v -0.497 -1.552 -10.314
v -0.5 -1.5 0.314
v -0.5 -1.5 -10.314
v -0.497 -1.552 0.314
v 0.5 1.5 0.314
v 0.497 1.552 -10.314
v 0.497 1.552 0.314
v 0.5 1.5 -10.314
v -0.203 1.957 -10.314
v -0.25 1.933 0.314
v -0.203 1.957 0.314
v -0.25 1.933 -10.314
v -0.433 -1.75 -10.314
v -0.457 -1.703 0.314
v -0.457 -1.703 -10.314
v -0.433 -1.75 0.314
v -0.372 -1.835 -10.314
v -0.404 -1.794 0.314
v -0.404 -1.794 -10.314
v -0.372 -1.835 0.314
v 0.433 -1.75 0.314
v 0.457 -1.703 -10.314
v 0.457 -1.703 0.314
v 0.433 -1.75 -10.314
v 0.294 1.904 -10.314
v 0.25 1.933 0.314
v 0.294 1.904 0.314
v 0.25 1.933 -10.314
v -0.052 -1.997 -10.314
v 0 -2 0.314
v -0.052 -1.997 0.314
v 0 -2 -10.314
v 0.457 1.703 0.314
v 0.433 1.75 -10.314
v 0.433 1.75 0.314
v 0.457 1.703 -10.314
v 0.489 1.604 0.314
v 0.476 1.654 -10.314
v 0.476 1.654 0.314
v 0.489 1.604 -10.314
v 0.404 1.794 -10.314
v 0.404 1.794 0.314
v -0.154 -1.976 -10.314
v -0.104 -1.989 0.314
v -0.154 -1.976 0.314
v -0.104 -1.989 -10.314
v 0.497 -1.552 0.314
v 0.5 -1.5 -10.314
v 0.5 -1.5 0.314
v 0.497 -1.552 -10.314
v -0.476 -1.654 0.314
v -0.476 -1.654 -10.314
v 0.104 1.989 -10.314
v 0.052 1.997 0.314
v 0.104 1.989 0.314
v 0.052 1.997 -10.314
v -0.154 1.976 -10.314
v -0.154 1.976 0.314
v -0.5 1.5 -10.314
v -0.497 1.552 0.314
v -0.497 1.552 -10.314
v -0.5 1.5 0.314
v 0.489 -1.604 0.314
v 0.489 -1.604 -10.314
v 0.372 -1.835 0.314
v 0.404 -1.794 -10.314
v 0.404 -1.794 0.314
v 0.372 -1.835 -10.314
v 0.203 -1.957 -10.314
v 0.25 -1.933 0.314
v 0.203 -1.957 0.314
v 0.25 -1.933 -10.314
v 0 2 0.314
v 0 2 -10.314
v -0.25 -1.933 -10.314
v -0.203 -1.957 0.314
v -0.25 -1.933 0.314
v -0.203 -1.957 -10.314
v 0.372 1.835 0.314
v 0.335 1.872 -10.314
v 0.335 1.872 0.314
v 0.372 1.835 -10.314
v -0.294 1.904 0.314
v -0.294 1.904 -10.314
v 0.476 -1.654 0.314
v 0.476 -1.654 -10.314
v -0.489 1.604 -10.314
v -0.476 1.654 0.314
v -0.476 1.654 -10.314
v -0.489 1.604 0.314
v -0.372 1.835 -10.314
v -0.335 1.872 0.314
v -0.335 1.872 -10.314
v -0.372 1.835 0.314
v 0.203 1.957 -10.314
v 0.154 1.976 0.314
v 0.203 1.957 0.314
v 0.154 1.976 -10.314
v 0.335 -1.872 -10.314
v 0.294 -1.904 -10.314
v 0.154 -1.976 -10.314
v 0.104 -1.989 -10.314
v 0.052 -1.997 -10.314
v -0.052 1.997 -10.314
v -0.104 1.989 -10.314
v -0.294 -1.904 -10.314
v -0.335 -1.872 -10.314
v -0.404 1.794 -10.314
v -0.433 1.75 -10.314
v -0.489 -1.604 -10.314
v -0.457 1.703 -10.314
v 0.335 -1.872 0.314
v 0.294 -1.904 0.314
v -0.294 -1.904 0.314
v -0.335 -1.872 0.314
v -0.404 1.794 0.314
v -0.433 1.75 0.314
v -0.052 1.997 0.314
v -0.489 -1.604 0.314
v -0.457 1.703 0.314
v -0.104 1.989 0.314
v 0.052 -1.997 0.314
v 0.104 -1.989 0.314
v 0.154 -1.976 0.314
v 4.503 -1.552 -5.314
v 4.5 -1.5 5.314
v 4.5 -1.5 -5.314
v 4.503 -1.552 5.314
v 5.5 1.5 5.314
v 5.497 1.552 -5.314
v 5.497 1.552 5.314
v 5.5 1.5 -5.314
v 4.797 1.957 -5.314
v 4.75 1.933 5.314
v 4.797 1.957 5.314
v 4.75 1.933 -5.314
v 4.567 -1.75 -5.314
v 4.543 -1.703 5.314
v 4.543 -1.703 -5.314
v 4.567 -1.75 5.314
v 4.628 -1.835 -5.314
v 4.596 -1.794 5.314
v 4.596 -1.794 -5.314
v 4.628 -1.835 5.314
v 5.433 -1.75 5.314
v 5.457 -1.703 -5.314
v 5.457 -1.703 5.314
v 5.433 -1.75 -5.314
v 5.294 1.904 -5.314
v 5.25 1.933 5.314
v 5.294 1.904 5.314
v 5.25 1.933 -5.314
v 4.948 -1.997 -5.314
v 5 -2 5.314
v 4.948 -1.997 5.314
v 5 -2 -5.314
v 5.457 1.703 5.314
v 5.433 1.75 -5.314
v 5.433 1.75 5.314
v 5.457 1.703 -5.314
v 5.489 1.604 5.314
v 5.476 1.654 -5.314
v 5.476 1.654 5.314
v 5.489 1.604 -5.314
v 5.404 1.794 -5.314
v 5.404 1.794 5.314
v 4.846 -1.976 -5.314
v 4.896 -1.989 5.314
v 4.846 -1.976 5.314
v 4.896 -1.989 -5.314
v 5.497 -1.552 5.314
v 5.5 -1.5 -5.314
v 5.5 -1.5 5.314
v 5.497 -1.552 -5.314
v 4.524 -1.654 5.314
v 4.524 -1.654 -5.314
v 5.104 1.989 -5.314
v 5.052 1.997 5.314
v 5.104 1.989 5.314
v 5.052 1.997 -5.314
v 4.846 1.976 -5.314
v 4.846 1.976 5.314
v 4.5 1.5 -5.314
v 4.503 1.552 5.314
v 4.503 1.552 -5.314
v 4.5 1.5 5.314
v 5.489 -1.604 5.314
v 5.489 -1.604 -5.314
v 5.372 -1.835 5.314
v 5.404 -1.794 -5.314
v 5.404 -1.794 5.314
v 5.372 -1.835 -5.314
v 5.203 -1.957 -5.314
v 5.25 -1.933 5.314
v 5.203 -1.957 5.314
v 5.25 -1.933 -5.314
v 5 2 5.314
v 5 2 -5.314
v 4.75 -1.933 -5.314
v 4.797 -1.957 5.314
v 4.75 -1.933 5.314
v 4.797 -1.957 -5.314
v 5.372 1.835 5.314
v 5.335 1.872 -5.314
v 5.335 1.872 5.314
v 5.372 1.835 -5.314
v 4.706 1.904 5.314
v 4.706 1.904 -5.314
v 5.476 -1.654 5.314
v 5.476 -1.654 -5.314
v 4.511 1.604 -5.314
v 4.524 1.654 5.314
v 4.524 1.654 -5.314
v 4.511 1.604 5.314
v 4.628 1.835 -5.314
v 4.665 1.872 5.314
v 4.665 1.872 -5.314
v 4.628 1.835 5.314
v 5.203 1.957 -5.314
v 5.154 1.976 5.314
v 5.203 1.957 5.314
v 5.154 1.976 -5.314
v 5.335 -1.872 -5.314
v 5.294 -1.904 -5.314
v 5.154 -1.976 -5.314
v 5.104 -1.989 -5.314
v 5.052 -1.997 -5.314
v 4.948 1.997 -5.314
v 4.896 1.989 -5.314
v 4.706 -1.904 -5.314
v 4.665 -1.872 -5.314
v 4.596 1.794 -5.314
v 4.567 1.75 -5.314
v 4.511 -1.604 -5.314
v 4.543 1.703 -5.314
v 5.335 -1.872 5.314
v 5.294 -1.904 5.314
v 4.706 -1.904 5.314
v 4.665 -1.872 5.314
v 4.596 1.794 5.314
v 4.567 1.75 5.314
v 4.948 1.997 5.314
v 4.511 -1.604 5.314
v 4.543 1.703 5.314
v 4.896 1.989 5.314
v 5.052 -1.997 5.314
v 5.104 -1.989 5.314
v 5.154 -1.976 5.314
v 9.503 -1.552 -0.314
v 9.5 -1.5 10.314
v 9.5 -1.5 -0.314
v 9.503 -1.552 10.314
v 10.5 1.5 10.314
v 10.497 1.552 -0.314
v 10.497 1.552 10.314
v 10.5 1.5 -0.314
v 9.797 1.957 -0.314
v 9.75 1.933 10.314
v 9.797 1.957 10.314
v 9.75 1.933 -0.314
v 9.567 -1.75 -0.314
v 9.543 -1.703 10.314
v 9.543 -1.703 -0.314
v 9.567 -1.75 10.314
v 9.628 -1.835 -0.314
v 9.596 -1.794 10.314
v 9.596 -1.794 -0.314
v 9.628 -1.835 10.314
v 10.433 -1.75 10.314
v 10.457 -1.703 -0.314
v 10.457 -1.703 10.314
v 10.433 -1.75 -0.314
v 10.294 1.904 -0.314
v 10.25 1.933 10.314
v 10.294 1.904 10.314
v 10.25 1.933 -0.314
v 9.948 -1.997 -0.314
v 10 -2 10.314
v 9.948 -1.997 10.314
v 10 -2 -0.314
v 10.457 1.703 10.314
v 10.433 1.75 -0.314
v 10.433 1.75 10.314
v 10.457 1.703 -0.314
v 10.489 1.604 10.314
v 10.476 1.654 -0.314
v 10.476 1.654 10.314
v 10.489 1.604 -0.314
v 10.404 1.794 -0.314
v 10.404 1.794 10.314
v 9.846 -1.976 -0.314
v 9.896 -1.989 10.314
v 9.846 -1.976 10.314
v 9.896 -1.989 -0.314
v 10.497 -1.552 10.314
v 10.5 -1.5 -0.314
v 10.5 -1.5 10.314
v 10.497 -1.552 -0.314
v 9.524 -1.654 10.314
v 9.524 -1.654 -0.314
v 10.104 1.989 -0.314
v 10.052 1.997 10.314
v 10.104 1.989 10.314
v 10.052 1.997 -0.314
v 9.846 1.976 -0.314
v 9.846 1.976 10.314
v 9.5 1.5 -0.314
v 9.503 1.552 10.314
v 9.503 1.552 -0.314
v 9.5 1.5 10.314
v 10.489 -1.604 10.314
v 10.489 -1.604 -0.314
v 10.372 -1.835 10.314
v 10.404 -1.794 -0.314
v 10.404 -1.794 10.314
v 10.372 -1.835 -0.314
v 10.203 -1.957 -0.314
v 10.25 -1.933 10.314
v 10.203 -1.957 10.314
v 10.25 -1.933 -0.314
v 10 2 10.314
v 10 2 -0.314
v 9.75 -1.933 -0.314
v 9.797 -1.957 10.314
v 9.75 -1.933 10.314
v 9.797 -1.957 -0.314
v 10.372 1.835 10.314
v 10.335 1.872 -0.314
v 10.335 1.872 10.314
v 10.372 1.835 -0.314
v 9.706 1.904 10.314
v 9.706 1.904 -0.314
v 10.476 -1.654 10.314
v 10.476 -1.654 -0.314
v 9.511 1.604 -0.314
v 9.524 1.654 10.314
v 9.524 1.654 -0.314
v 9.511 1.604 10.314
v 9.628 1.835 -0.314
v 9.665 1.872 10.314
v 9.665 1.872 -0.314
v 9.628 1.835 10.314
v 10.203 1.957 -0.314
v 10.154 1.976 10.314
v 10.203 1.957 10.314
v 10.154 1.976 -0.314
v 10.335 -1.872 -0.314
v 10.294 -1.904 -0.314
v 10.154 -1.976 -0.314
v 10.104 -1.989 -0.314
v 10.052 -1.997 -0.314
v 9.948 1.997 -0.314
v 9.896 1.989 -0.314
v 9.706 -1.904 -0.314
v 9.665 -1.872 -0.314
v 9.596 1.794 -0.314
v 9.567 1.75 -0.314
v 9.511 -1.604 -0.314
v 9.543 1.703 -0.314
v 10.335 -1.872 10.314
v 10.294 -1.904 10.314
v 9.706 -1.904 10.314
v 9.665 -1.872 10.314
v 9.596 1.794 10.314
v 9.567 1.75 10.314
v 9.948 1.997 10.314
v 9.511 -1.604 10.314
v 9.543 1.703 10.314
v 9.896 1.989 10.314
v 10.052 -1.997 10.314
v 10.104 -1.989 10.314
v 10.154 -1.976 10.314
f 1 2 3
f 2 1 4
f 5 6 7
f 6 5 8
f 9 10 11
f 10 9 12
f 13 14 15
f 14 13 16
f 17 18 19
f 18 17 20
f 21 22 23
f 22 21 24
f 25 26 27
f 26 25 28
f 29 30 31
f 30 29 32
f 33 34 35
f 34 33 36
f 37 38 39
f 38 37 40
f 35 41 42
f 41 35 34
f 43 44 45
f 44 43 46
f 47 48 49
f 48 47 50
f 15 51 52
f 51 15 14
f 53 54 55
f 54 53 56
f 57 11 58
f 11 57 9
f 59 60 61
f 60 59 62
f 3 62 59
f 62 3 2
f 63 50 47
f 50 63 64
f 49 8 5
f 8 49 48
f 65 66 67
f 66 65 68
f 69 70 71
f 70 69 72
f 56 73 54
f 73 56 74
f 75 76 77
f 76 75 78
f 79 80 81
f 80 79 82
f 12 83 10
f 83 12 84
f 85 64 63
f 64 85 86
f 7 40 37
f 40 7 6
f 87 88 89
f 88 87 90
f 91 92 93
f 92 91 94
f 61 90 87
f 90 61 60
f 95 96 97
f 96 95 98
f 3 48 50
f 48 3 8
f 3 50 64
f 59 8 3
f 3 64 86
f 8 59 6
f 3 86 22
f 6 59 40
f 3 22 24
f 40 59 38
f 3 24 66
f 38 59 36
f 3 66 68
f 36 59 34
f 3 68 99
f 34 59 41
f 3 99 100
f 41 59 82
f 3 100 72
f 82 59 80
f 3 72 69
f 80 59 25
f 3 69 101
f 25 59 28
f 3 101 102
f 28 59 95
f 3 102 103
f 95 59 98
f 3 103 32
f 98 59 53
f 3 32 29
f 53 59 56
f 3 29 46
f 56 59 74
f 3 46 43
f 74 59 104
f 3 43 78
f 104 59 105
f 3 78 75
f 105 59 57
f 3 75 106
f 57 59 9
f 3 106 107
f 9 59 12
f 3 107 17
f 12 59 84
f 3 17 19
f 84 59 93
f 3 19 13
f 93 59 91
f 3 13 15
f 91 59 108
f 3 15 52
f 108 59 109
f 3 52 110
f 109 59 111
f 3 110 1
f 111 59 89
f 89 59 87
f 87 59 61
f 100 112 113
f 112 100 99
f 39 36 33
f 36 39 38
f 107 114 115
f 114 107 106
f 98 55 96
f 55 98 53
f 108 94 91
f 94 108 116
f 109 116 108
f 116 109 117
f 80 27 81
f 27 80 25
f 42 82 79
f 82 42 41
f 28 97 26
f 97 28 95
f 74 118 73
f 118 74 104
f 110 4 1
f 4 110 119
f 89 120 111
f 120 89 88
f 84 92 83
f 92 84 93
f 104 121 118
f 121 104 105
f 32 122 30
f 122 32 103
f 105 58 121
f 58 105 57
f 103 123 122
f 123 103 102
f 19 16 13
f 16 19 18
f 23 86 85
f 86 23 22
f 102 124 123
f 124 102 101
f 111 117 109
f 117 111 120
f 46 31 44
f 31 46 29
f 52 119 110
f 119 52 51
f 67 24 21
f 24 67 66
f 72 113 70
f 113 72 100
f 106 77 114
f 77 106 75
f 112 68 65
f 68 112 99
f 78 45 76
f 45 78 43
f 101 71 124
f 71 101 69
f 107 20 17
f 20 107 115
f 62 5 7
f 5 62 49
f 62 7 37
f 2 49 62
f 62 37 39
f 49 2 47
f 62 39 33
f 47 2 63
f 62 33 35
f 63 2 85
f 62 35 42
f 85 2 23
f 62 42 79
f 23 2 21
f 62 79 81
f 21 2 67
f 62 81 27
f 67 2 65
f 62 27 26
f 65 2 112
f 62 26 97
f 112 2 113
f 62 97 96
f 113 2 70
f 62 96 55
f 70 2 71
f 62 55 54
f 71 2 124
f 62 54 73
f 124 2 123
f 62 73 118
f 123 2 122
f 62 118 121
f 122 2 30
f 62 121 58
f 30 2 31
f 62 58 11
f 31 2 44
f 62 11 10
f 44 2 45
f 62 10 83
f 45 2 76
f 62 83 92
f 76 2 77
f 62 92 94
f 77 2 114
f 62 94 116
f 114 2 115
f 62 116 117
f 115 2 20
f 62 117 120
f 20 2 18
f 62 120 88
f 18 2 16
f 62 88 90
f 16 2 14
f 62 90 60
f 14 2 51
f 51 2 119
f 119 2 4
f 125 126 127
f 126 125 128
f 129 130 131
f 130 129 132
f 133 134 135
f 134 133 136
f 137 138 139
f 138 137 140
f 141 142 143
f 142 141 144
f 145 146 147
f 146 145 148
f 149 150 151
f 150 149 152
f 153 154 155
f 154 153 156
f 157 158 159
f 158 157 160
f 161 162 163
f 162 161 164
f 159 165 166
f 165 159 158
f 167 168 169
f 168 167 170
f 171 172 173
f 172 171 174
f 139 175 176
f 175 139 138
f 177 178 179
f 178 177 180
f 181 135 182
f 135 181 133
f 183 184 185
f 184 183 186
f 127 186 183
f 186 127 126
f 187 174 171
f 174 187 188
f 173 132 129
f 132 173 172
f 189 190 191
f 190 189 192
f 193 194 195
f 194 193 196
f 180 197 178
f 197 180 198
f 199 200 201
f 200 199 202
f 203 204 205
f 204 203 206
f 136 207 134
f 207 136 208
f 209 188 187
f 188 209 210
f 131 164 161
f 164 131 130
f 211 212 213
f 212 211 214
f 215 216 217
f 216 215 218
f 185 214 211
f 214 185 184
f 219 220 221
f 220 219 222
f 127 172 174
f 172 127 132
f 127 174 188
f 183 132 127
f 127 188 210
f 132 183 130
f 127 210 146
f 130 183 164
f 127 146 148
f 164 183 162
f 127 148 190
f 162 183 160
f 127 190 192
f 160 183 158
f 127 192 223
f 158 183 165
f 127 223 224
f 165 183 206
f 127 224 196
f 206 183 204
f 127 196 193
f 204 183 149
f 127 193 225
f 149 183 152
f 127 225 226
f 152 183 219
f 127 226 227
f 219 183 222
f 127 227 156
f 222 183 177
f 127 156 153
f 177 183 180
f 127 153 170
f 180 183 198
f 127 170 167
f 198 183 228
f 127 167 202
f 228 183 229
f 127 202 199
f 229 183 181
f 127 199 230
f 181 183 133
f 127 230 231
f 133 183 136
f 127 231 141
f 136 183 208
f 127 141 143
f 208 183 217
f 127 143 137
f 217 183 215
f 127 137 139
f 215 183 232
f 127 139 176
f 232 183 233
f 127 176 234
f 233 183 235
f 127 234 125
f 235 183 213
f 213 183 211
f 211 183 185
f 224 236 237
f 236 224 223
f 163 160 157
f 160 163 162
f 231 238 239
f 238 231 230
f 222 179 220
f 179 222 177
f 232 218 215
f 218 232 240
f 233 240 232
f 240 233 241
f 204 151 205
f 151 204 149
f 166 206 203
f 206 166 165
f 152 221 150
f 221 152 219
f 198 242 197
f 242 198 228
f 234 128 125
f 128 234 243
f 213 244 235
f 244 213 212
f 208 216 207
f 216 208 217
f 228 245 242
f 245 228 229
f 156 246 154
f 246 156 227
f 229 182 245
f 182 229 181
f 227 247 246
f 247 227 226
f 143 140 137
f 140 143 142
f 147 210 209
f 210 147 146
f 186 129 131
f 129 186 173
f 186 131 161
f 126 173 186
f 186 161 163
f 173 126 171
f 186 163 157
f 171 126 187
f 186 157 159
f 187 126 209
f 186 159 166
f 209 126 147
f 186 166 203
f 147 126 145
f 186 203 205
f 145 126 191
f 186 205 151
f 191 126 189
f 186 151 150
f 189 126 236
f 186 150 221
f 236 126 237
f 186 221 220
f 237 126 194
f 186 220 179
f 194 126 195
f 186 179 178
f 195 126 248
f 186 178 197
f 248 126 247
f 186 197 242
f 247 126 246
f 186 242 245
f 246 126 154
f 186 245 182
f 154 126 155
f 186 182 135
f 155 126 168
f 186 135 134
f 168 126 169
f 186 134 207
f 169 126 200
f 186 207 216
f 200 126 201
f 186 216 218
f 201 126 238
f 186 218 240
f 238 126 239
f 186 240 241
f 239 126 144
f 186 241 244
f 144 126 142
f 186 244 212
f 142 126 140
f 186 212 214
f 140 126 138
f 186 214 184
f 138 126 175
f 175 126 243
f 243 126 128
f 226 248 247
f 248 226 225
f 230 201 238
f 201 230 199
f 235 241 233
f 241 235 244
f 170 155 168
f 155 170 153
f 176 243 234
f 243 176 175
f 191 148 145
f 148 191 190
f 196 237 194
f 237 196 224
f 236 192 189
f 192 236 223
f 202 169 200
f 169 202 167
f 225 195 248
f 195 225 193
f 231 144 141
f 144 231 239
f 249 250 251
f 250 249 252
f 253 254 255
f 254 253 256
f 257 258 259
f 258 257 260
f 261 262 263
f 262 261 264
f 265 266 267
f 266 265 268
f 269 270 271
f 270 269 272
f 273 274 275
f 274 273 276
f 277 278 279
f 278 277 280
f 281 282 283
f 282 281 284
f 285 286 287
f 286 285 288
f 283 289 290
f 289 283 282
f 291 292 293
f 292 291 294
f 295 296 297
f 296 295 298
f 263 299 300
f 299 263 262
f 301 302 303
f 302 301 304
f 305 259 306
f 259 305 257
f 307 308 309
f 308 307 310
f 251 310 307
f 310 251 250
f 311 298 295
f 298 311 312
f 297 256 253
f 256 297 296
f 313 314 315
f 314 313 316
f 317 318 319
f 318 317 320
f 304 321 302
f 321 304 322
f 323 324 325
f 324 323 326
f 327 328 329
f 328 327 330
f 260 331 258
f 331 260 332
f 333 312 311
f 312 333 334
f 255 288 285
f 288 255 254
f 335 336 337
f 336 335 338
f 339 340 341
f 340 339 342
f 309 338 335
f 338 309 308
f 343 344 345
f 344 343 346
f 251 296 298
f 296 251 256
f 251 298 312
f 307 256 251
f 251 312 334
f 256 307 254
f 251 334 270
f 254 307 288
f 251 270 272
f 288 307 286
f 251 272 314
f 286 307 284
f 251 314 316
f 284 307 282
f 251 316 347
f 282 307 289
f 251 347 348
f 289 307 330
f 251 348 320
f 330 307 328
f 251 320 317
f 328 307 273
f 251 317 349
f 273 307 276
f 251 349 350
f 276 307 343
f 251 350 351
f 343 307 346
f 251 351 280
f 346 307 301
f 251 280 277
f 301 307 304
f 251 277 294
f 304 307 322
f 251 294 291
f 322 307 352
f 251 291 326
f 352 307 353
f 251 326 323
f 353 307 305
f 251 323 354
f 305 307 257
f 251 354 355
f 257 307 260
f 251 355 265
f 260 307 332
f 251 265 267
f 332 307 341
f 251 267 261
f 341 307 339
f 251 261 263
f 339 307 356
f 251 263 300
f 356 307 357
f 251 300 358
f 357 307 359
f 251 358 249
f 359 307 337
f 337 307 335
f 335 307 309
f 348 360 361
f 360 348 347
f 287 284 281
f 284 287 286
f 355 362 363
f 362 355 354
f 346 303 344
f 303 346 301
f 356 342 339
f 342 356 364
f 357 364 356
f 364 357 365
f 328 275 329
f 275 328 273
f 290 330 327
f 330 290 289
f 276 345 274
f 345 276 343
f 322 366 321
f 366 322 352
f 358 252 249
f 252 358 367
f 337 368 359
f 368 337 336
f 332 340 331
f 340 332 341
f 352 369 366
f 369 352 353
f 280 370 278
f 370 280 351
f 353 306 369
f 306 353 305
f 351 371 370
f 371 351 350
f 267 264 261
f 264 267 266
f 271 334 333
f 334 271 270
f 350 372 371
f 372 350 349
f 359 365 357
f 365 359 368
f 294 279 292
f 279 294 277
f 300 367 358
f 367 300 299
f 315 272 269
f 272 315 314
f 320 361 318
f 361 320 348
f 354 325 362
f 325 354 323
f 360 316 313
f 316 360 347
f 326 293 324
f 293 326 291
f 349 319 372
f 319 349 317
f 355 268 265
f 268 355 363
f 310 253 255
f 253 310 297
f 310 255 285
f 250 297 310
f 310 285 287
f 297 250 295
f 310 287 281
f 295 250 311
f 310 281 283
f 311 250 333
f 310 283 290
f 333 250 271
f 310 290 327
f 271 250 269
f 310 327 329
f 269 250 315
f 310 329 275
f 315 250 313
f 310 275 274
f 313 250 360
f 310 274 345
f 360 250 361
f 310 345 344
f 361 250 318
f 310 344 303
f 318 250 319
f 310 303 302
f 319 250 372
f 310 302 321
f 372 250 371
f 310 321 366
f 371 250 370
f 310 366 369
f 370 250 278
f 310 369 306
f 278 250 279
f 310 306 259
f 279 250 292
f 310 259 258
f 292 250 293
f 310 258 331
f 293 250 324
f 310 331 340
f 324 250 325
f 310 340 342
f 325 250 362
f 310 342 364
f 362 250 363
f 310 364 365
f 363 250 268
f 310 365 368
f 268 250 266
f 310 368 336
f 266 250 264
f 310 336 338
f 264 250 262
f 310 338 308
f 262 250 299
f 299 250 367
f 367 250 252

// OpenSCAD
// Unit of length: Unit.MM
$fn = 60;

union()
{
   translate(v = [0.0, 0.0, -10.0])
   {
      translate(v = [0.0, 0.0, -0.314])
      {
         linear_extrude(height = 10.628, center = false, twist = 0.0, scale = 1.0)
         {
            union()
            {
               translate(v = [0.0, -1.5])
               {
                  circle(d = 1.0);
               }
               square(size = [1.0, 3.0], center = true);
               translate(v = [0.0, 1.5])
               {
                  circle(d = 1.0);
               }
            }
         }
      }
   }
   translate(v = [5.0, 0.0, 0.0])
   {
      linear_extrude(height = 10.628, center = true, twist = 0.0, scale = 1.0)
      {
         union()
         {
            translate(v = [0.0, -1.5])
            {
               circle(d = 1.0);
            }
            square(size = [1.0, 3.0], center = true);
            translate(v = [0.0, 1.5])
            {
               circle(d = 1.0);
            }
         }
      }
   }
   translate(v = [10.0, 0.0, 0.0])
   {
      translate(v = [0.0, 0.0, -0.314])
      {
         linear_extrude(height = 10.628, center = false, twist = 0.0, scale = 1.0)
         {
            union()
            {
               translate(v = [0.0, -1.5])
               {
                  circle(d = 1.0);
               }
               square(size = [1.0, 3.0], center = true);
               translate(v = [0.0, 1.5])
               {
                  circle(d = 1.0);
               }
            }
         }
      }
   }
}
